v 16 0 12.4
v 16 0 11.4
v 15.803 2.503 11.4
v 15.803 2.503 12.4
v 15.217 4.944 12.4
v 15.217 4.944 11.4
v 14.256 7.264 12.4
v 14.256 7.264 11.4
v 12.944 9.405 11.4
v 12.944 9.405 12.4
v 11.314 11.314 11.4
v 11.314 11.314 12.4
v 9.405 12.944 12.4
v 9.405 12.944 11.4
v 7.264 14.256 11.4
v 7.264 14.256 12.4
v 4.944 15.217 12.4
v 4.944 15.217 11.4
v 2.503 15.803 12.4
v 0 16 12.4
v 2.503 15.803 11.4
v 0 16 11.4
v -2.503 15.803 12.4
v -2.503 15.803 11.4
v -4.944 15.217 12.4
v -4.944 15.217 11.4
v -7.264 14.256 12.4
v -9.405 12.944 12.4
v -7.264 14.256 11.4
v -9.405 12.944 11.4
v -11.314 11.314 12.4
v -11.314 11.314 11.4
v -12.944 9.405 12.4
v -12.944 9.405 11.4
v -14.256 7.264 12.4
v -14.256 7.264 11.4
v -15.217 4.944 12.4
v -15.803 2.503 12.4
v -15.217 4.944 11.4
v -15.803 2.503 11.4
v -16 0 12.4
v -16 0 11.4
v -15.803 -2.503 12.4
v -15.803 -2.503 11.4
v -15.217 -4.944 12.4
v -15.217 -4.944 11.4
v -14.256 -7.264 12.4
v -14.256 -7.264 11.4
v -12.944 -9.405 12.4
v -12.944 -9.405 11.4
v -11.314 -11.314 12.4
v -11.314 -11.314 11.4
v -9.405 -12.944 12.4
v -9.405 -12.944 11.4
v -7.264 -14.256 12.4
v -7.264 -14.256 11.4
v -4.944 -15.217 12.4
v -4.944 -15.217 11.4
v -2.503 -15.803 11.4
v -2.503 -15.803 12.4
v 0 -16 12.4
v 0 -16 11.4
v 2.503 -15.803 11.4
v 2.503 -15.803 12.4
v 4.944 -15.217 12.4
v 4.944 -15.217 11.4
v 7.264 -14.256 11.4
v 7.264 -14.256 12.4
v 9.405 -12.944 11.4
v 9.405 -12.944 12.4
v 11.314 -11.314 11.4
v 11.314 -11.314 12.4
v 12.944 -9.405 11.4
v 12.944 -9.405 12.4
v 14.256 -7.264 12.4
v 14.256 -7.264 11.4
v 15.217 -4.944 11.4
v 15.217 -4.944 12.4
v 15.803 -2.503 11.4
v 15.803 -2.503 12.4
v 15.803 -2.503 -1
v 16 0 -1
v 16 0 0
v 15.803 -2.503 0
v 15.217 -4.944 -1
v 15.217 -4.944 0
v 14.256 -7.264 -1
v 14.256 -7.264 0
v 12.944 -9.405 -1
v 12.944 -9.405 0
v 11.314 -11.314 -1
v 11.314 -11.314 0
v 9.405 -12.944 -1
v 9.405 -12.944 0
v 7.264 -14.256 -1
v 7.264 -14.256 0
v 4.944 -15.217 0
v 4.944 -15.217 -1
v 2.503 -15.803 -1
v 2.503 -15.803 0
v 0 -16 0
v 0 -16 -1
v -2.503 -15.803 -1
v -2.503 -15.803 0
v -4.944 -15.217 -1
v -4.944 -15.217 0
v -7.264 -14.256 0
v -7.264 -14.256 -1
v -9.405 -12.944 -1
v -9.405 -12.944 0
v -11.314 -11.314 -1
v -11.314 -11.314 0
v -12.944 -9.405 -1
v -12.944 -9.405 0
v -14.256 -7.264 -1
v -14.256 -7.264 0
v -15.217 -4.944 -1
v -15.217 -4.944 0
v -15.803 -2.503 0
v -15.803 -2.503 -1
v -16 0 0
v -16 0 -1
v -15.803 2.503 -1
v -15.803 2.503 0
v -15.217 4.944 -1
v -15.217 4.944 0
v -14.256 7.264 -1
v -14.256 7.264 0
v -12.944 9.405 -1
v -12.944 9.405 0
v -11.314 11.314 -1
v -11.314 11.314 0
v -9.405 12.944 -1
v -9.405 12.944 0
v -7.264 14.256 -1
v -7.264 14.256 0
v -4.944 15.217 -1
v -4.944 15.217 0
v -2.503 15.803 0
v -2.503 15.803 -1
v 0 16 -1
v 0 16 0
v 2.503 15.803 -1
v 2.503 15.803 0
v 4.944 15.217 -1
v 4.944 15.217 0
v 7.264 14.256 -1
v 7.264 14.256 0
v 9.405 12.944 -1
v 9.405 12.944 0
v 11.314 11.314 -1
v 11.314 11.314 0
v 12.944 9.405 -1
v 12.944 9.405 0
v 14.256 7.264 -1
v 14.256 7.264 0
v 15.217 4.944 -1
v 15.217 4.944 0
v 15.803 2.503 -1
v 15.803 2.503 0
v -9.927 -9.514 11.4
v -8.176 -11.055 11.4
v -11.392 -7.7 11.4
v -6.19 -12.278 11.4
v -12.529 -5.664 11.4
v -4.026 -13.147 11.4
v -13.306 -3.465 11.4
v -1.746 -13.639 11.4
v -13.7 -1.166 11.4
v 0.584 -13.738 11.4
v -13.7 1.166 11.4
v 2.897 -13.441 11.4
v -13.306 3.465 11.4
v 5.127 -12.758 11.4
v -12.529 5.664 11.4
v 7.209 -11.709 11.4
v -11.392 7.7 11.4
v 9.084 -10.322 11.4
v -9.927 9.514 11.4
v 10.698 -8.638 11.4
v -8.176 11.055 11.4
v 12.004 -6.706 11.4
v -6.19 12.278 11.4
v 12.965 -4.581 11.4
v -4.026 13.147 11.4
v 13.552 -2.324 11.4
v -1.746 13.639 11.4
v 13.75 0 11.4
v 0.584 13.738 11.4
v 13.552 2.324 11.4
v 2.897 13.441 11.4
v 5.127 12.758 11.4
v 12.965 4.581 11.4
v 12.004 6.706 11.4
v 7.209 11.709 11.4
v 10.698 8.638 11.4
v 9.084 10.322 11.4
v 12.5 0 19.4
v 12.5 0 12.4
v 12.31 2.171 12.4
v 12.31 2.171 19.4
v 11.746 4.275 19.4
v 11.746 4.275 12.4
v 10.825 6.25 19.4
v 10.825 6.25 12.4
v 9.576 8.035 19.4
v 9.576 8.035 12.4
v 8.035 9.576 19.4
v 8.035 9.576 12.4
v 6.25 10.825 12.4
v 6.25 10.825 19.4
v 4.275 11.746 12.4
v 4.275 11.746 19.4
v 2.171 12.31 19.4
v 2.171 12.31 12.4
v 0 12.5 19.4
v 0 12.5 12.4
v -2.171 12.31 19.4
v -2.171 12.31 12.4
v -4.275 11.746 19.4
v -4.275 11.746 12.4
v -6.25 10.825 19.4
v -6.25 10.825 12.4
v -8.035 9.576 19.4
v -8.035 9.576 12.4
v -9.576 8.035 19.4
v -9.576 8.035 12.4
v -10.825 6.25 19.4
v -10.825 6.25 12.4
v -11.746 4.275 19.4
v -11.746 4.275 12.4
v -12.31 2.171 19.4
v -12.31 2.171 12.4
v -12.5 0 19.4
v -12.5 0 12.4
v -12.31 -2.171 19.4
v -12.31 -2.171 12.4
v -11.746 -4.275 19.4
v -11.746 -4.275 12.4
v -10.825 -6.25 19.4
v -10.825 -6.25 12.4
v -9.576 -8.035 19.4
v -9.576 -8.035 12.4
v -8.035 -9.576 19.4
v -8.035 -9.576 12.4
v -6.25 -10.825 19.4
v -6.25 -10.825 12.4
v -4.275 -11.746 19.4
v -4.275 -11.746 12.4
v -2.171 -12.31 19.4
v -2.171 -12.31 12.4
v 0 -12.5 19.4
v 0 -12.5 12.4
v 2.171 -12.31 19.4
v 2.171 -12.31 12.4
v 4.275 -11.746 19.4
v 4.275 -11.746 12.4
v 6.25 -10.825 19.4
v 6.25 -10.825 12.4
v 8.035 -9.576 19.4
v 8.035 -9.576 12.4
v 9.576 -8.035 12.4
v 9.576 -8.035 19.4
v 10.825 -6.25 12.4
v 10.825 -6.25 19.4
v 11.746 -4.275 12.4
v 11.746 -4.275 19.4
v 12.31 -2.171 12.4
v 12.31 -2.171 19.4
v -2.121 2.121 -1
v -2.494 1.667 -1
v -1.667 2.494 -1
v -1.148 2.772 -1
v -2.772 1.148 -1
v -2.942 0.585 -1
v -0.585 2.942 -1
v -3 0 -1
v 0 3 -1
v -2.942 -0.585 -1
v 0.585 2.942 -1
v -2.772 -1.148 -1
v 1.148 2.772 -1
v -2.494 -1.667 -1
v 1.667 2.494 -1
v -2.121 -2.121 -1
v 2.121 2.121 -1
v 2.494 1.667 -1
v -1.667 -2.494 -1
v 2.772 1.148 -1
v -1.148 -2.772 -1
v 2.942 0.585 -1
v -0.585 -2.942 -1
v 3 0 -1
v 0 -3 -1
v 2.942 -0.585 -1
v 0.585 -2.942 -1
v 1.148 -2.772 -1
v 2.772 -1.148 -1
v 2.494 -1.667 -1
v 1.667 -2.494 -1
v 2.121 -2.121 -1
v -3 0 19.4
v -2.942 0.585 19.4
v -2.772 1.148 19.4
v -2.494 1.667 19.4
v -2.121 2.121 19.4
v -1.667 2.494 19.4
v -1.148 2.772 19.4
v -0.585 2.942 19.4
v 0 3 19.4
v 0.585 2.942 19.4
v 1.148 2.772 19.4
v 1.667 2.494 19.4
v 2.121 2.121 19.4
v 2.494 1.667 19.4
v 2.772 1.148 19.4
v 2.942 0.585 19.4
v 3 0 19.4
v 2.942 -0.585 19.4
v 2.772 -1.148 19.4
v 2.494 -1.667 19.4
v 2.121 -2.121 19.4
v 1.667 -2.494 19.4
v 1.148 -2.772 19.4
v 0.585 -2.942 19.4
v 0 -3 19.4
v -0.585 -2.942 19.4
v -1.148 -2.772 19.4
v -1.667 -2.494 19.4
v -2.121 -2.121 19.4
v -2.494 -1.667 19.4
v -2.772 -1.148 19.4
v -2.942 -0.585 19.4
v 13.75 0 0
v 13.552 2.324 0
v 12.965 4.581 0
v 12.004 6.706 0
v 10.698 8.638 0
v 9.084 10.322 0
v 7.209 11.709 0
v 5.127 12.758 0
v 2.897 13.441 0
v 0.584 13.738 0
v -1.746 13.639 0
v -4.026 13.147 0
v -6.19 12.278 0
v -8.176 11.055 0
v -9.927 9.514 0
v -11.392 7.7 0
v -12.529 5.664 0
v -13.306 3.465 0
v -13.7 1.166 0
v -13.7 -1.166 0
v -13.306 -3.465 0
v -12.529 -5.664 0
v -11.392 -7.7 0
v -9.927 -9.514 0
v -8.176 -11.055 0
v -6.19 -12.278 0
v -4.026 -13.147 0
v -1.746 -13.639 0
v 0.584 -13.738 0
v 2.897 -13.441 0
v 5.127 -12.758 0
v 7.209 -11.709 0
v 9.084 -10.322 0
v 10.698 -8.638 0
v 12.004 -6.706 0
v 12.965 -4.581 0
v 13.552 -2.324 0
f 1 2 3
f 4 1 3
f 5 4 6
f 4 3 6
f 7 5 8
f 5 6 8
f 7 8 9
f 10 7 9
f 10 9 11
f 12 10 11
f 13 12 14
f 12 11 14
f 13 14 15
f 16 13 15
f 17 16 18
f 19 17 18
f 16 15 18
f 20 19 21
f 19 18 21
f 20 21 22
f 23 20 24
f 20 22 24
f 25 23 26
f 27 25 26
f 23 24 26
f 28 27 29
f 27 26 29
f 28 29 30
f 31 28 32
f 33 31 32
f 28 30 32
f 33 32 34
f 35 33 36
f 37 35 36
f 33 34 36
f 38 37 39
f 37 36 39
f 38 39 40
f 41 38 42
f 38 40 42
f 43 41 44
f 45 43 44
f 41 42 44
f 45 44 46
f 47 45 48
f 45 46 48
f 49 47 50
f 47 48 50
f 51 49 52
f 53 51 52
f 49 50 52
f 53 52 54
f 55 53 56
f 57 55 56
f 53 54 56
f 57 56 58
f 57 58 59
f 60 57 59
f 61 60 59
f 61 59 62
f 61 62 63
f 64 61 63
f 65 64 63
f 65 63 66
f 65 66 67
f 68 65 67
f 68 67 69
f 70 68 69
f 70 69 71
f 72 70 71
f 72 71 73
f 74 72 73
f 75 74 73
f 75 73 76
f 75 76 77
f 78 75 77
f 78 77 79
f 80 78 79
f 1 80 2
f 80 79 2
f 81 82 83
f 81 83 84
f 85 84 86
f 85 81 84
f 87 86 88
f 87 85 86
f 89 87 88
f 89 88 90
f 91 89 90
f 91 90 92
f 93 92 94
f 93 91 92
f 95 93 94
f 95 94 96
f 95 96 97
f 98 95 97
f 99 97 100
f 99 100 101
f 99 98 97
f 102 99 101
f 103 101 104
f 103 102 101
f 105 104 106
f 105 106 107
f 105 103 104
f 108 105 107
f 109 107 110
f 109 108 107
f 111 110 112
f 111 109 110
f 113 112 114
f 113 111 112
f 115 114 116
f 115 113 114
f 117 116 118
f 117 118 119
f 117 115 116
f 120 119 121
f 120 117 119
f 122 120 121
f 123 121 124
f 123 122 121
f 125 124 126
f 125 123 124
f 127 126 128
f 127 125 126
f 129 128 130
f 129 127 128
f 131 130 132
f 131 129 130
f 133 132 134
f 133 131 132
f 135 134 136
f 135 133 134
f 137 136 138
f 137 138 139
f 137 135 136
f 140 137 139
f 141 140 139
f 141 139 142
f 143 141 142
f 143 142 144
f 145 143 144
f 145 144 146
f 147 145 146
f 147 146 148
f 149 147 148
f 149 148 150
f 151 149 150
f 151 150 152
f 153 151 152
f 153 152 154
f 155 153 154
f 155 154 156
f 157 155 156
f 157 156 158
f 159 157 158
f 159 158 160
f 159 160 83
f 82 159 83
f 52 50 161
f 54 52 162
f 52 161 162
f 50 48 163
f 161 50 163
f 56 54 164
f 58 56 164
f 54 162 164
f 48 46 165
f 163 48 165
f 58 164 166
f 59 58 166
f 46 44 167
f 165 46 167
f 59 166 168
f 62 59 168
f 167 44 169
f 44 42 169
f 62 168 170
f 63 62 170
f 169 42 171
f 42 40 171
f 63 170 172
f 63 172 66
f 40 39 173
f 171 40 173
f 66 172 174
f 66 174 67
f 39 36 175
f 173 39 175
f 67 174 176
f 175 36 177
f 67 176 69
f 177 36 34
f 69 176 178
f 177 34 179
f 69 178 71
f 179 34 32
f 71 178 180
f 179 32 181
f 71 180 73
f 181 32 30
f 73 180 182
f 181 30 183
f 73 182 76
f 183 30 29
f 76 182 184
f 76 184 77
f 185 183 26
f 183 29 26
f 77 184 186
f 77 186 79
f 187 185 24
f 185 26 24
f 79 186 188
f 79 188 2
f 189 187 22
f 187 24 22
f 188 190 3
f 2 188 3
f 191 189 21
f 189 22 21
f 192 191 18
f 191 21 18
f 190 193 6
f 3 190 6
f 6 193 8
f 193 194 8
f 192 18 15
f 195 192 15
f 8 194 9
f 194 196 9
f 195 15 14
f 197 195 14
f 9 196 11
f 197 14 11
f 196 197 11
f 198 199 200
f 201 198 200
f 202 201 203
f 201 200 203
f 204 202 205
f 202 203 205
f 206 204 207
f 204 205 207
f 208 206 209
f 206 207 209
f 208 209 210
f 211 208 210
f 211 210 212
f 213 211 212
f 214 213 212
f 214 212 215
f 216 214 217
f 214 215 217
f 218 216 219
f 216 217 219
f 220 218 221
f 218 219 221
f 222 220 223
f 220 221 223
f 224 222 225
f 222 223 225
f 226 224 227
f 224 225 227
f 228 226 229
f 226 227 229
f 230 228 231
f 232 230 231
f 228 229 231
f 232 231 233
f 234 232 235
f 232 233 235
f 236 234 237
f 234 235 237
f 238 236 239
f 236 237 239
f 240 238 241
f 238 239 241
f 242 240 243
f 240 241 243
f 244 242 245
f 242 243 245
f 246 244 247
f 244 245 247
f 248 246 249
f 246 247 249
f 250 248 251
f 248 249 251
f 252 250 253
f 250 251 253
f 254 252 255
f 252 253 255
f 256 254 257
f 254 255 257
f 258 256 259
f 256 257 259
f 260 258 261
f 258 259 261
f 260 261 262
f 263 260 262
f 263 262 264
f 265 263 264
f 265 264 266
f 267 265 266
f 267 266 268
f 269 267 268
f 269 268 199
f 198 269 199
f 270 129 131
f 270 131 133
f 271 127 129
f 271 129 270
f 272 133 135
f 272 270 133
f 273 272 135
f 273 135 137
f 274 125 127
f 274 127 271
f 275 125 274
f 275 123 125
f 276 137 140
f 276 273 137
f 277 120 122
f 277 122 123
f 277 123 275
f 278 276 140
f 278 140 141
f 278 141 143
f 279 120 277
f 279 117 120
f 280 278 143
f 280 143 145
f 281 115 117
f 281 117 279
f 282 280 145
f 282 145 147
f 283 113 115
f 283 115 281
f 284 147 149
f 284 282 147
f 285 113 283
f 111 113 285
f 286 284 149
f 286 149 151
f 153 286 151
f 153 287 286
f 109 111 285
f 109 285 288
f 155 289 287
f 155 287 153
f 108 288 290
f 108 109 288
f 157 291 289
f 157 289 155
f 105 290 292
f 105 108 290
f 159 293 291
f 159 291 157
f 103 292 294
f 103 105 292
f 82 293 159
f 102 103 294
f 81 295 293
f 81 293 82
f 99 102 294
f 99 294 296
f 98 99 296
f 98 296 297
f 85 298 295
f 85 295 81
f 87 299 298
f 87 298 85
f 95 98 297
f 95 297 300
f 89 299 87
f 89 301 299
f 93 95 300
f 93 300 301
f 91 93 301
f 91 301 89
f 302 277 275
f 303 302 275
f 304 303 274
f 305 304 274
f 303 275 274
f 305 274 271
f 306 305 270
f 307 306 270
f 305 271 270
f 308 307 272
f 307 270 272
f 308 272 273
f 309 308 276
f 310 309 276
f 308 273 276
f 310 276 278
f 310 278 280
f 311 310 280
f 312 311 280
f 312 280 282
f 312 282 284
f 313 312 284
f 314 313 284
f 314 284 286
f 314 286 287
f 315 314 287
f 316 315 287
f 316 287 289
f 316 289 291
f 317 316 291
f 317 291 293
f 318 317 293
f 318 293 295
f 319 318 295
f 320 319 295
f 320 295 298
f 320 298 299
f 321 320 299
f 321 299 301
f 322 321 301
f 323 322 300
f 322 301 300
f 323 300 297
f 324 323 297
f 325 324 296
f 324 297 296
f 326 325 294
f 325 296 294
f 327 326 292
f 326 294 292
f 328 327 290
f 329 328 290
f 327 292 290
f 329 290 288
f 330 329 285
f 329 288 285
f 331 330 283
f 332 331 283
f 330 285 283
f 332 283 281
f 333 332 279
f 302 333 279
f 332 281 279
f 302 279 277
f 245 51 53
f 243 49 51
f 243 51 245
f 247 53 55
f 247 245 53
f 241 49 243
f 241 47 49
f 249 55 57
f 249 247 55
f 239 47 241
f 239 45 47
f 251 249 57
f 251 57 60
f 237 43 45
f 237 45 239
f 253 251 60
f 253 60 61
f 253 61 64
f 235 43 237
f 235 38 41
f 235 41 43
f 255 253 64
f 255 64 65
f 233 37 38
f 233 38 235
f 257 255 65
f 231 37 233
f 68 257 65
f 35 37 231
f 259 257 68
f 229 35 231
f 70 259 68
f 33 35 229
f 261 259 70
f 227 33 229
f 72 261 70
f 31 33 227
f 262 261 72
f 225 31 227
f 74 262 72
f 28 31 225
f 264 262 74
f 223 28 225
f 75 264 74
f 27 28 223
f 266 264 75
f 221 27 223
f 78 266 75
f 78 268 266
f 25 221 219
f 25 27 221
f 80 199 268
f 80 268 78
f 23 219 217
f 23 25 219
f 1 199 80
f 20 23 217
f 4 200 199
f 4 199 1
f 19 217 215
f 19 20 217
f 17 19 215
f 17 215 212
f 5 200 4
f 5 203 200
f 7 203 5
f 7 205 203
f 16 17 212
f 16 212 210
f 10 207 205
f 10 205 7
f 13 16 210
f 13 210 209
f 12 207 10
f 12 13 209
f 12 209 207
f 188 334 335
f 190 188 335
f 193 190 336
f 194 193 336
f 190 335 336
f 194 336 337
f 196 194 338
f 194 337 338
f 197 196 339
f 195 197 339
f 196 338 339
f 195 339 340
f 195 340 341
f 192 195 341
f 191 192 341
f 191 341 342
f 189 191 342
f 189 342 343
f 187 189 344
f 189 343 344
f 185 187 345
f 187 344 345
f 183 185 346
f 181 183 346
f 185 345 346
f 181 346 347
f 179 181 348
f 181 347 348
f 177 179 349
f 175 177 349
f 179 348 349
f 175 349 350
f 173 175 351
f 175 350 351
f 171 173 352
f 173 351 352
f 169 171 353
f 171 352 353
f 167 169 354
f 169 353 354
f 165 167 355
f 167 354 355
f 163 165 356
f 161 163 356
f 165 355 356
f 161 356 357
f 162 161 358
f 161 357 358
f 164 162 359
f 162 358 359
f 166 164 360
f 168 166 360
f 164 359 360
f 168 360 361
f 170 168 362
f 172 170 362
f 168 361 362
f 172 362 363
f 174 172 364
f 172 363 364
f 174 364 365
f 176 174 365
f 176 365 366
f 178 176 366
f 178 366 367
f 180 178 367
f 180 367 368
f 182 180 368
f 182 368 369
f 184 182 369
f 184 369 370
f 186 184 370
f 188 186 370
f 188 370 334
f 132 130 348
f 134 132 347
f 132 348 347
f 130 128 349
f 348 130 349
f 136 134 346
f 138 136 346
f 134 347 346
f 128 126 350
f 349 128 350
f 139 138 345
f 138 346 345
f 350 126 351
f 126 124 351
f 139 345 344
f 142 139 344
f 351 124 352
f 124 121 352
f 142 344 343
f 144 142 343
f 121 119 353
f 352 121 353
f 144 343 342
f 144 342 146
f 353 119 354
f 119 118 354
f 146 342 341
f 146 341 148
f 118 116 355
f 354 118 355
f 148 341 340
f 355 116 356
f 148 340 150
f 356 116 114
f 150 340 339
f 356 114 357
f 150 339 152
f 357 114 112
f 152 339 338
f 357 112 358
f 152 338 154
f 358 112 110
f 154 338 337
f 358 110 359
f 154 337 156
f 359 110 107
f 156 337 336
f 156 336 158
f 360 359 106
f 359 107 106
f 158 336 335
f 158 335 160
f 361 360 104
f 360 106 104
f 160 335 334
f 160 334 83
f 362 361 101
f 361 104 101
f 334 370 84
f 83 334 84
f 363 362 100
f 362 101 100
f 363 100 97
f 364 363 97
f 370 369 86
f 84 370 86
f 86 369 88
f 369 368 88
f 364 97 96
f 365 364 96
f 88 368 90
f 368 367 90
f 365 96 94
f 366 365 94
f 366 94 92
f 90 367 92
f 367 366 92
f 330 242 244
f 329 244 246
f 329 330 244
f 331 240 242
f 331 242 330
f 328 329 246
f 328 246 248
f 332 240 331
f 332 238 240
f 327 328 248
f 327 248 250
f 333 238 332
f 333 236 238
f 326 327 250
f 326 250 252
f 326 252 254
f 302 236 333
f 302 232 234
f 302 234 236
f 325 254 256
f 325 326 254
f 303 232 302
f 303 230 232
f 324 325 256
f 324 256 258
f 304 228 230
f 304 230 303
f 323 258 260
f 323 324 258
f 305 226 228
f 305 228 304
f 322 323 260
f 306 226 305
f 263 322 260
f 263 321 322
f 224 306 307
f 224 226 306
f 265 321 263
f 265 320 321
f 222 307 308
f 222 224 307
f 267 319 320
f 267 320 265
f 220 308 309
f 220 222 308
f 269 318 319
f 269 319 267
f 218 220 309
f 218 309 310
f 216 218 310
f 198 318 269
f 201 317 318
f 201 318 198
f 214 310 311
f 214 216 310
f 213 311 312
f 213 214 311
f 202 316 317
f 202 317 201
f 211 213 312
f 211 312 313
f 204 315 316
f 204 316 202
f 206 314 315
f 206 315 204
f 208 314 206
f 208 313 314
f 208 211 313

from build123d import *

# Parameters (mm, degrees)
ESQUISSE1_R             = 13.75
BOSS_EXTRU_1_DEPTH      = 11.4
ESQUISSE2_R             = 16
BOSS_EXTRU_2_DEPTH      = 1
BOSS_EXTRU_3_START      = 1
ESQUISSE3_R             = 16
BOSS_EXTRU_3_DEPTH      = 1
ESQUISSE4_R             = 12.5
BOSS_EXTRU_4_DEPTH      = 7
ESQUISSE5_R             = 3
ENL_V_MAT_EXTRU_1_DEPTH = 30


with BuildPart() as part:
    # Esquisse1 → Boss.-Extru.1 (new body)
    with BuildSketch(Plane.XY):
        Circle(ESQUISSE1_R)
    extrude(amount=BOSS_EXTRU_1_DEPTH)

    # Esquisse2 → Boss.-Extru.2 (add)
    with BuildSketch(Plane.XY.offset(11.4)):
        Circle(ESQUISSE2_R)
    extrude(amount=BOSS_EXTRU_2_DEPTH)

    # Esquisse3 → Boss.-Extru.3 (add)
    with BuildSketch(Plane(origin=(0, 0, 0), x_dir=(-1, 0, 0), z_dir=(0, 0, -1)).offset(BOSS_EXTRU_3_START)):
        with Locations(Location((0, 0, 0), (0, 0, 180))):
            Circle(ESQUISSE3_R)
    extrude(amount=-BOSS_EXTRU_3_DEPTH)

    # Esquisse4 → Boss.-Extru.4 (add)
    with BuildSketch(Plane.XY.offset(12.4)):
        Circle(ESQUISSE4_R)
    extrude(amount=BOSS_EXTRU_4_DEPTH)

    # Esquisse5 → Enlèv. mat.-Extru.1 (cut)
    with BuildSketch(Plane(origin=(0, 0, -1), x_dir=(-1, 0, 0), z_dir=(0, 0, -1))):
        Circle(ESQUISSE5_R)
    extrude(amount=-ENL_V_MAT_EXTRU_1_DEPTH, mode=Mode.SUBTRACT)


solid = part.part
